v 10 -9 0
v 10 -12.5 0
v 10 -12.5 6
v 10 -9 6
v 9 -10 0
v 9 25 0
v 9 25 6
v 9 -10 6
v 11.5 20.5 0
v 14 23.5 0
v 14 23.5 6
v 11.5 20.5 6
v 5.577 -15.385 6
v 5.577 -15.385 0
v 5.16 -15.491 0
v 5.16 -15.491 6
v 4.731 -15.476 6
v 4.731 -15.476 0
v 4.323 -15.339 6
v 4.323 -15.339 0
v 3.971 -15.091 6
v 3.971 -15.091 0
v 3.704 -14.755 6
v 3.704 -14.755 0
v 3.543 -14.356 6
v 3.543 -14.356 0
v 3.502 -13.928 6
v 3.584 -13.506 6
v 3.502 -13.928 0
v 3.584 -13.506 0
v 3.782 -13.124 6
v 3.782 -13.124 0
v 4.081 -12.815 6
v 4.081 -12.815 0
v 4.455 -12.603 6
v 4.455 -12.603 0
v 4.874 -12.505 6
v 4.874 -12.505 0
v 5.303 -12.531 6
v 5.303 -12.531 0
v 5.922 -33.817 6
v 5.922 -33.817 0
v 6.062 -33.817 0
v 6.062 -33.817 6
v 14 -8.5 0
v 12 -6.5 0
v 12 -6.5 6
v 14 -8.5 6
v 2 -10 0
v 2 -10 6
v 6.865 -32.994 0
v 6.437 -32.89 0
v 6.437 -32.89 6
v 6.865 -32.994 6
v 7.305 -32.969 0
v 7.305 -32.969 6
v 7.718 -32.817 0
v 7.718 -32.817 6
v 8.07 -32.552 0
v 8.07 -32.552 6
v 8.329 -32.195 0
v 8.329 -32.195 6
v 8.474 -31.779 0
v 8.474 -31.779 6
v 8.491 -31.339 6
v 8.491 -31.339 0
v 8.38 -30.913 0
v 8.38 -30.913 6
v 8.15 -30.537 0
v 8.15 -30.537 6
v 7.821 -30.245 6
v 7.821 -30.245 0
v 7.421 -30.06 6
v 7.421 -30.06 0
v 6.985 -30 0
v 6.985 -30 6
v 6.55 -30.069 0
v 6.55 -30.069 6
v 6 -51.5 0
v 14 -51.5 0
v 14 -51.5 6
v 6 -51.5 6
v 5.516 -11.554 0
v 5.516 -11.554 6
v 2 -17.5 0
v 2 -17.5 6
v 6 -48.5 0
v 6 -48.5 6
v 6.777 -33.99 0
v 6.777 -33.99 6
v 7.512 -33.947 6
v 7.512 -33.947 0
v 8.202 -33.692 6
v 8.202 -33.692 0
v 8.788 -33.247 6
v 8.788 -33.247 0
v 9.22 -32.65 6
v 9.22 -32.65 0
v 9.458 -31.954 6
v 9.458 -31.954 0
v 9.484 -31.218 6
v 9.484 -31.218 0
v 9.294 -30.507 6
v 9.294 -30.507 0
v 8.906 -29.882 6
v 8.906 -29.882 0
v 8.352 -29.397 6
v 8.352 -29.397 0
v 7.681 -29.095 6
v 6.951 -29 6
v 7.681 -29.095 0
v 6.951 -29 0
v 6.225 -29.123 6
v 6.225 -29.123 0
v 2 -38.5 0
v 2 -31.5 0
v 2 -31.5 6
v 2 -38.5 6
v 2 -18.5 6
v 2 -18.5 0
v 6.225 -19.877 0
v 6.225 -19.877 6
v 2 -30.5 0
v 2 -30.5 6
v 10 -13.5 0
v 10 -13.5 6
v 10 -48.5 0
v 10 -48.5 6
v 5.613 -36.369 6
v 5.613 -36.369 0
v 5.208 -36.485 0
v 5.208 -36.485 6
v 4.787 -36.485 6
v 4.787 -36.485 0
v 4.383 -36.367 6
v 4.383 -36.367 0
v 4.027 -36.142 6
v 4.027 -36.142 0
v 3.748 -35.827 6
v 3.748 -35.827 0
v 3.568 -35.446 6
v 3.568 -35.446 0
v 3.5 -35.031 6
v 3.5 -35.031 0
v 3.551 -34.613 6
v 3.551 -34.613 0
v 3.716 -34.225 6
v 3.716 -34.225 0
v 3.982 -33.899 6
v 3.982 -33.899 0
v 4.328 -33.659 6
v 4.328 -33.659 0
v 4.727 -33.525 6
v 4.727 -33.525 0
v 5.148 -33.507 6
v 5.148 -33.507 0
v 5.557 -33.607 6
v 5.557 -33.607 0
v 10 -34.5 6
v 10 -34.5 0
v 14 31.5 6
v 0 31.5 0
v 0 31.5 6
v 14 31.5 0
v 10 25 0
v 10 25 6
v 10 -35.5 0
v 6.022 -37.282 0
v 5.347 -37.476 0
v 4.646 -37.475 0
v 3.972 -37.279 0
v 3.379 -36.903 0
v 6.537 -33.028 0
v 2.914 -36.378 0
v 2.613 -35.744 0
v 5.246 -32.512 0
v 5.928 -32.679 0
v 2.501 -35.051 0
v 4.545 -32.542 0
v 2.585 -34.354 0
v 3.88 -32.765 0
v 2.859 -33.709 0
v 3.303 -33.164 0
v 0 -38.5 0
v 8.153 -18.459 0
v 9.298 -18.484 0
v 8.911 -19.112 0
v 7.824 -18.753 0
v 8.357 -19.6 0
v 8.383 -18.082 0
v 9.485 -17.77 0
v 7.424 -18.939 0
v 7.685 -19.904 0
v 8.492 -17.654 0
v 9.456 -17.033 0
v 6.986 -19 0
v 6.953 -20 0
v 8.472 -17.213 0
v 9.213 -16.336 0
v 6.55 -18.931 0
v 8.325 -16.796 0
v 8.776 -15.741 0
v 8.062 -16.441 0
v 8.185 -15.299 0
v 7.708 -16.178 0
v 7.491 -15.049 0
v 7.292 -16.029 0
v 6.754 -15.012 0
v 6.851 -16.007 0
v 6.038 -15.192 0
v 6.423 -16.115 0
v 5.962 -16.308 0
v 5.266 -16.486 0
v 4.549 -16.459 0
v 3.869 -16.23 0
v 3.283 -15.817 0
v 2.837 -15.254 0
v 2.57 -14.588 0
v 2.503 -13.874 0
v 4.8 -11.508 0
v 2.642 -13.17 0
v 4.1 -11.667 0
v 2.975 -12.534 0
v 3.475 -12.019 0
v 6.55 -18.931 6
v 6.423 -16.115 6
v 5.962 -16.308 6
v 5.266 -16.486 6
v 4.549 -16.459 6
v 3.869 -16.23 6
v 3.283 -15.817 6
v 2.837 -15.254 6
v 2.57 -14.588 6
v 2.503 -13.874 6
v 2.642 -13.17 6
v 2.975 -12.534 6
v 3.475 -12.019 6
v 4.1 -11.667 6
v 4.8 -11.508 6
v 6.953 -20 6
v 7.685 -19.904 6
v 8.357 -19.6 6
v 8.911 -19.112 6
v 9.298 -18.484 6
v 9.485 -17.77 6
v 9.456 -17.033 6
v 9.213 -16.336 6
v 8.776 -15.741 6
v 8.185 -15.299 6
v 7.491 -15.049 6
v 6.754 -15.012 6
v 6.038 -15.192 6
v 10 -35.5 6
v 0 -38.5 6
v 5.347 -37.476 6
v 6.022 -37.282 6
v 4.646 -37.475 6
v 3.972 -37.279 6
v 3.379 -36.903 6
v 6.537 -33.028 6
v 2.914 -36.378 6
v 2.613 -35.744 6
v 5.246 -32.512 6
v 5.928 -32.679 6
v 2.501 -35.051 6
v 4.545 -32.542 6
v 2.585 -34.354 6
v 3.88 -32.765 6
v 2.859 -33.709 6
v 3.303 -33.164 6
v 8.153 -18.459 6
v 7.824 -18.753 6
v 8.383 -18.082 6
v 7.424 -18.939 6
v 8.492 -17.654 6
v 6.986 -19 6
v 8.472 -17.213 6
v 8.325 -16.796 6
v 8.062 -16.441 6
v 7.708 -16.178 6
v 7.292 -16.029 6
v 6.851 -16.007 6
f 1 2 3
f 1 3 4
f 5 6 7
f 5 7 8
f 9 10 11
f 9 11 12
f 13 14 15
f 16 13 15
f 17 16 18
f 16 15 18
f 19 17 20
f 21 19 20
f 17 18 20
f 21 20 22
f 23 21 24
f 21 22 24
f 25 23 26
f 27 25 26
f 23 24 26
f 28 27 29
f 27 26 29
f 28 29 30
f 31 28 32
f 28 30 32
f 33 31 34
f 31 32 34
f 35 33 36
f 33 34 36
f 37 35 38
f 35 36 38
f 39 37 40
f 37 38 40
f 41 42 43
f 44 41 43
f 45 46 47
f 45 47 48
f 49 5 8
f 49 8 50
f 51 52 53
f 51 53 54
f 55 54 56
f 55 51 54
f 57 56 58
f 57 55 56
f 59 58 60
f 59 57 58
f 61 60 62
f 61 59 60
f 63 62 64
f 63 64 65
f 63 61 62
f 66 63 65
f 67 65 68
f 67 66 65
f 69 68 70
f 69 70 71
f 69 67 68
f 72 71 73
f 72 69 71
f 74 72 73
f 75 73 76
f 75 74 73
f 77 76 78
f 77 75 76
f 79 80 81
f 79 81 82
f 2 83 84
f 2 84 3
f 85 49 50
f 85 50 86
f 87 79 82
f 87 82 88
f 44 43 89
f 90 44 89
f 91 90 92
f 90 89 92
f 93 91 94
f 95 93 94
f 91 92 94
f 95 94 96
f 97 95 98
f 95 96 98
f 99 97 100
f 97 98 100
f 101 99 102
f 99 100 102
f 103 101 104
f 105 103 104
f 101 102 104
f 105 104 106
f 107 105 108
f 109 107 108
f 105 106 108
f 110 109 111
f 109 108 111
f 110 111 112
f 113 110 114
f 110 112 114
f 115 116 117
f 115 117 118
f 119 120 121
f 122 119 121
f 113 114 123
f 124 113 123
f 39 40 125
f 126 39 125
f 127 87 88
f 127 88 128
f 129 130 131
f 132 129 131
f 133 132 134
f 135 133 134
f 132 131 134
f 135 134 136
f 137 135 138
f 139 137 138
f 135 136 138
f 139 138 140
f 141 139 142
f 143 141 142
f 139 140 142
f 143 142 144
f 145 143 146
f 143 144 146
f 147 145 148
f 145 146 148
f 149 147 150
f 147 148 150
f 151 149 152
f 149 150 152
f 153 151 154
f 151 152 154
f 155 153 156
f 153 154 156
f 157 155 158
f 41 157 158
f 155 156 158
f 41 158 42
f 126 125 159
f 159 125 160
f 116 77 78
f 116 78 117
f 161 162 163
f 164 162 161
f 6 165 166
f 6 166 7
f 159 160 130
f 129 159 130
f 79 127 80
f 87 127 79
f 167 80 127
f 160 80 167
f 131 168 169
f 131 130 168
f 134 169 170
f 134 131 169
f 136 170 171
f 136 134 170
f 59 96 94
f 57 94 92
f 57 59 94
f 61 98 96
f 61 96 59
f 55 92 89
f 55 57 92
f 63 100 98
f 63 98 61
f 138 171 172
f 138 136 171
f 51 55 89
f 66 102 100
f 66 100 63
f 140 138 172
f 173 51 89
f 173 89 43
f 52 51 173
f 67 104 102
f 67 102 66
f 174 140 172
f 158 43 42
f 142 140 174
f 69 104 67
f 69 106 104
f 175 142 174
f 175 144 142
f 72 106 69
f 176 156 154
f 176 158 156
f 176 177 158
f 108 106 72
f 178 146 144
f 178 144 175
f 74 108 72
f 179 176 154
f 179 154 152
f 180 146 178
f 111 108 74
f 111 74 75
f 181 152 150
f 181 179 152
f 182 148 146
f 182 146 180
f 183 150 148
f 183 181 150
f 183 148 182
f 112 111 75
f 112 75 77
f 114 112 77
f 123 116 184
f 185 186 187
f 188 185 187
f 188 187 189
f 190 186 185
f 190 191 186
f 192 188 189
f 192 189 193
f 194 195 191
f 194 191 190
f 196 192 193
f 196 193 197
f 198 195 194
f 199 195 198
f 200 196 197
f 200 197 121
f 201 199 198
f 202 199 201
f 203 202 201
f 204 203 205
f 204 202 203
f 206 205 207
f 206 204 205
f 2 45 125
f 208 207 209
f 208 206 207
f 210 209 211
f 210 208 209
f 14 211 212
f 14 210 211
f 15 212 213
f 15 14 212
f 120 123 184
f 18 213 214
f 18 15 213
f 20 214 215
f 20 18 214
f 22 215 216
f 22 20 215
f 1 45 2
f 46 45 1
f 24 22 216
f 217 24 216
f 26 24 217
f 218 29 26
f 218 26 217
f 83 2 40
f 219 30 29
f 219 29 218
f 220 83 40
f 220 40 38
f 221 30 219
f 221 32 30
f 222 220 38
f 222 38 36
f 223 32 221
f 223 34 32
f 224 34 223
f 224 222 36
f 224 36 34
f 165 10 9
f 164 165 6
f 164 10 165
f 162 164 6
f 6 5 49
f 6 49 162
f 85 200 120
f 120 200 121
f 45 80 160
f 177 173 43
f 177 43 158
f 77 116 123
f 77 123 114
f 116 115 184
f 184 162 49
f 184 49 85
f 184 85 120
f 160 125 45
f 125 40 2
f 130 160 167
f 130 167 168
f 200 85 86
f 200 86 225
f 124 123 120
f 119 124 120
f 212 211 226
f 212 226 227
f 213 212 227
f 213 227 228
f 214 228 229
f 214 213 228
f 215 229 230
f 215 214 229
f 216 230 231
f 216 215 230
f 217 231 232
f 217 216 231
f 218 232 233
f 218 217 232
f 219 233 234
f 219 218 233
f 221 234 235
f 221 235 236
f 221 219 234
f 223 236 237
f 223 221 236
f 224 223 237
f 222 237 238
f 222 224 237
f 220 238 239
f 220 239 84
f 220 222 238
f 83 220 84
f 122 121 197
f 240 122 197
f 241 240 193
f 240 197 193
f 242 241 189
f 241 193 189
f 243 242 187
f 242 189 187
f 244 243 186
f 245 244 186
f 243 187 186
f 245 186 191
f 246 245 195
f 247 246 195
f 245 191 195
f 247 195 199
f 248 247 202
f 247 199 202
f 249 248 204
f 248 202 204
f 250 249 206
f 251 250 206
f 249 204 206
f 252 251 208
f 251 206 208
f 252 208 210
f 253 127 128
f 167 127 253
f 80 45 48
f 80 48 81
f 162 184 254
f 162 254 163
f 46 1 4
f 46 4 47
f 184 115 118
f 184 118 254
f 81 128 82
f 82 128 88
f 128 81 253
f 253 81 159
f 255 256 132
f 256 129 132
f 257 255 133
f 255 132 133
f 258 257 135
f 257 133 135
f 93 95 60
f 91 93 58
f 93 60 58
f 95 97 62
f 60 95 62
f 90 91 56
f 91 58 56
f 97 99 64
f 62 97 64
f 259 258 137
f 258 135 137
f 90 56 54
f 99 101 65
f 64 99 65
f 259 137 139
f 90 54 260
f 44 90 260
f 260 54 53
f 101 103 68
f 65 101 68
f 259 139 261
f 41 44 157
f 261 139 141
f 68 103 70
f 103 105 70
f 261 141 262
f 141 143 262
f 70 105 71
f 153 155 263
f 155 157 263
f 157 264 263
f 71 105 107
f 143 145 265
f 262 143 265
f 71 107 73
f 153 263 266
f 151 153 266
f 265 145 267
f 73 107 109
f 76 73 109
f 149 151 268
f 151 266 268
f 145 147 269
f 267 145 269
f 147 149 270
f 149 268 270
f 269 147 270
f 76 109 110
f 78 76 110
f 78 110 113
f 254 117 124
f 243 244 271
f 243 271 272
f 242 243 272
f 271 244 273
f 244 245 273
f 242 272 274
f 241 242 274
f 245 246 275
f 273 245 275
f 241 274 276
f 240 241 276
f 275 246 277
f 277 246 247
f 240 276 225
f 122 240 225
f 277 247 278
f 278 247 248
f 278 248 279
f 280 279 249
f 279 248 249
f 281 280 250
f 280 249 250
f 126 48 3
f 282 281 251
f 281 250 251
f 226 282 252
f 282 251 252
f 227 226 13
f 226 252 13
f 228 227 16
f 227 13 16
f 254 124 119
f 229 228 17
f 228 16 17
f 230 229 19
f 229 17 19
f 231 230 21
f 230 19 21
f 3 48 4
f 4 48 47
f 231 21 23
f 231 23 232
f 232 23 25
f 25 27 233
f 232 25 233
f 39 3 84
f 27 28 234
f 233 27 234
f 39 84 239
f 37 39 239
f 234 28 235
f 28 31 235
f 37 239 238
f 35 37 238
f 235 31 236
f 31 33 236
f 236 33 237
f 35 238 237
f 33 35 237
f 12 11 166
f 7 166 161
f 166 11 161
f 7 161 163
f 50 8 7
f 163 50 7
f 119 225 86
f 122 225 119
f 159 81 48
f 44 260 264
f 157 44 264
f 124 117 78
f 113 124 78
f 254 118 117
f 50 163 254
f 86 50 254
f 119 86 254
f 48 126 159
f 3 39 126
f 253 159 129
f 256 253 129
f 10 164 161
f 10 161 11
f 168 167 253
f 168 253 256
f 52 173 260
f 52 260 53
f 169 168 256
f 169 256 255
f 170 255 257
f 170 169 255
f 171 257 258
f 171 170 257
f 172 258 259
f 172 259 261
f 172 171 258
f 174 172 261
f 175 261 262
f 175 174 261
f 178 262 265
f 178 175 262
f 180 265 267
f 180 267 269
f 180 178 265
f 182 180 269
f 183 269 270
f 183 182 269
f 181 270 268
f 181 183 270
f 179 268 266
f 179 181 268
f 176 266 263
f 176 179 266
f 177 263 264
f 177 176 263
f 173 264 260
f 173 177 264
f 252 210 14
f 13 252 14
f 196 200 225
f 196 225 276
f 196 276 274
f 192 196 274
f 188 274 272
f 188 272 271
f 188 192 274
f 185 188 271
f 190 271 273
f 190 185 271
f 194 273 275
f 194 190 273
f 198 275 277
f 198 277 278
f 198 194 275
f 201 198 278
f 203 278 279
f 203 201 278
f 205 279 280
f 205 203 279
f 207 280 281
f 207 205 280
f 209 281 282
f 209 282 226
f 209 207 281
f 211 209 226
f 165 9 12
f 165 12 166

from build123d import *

# Parameters (mm, degrees)
BOSS_EXTRUDE4_DEPTH = 6


with BuildPart() as part:
    # Sketch5 → Boss-Extrude4 (new body)
    with BuildSketch(Plane.XY):
        with BuildLine():
            Line((0, 31.5), (14, 31.5))
            Line((14, 31.5), (14, 23.5))
            Line((14, 23.5), (11.5, 20.5))
            Line((11.5, 20.5), (10, 25))
            Line((10, 25), (9, 25))
            Line((9, 25), (9, -10))
            Line((9, -10), (2, -10))
            Line((2, -10), (2, -17.5))
            Line((2, -17.5), (6.55, -18.930908802))
            ThreePointArc((6.55, -18.930908802), (8.498478182, -17.432449005), (6.423076923, -16.115384615))
            Line((6.423076923, -16.115384615), (5.961538462, -16.307692308))
            ThreePointArc((5.961538462, -16.307692308), (2.51090022, -14.2332001), (5.516159308, -11.55386436))
            Line((5.516159308, -11.55386436), (10, -12.5))
            Line((10, -12.5), (10, -9))
            Line((10, -9), (12, -6.5))
            Line((12, -6.5), (14, -8.5))
            Line((14, -8.5), (14, -51.5))
            Line((14, -51.5), (6, -51.5))
            Line((6, -51.5), (6, -48.5))
            Line((6, -48.5), (10, -48.5))
            Line((10, -48.5), (10, -35.5))
            Line((10, -35.5), (6.021836686, -37.28163314))
            ThreePointArc((6.021836686, -37.28163314), (2.518102723, -34.699690318), (6.536534963, -33.027929944))
            Line((6.536534963, -33.027929944), (6.436915421, -32.8903006))
            ThreePointArc((6.436915421, -32.8903006), (8.498796421, -31.560077342), (6.55, -30.069091198))
            Line((6.55, -30.069091198), (2, -31.5))
            Line((2, -31.5), (2, -38.5))
            Line((2, -38.5), (0, -38.5))
            Line((0, -38.5), (0, 31.5))
        make_face()
        with BuildLine():
            Line((10, -13.5), (10, -34.5))
            Line((10, -34.5), (5.613102012, -36.368979884))
            ThreePointArc((5.613102012, -36.368979884), (3.510861634, -34.819814191), (5.921920978, -33.816757966))
            Line((5.921920978, -33.816757966), (6.061525702, -33.817167666))
            ThreePointArc((6.061525702, -33.817167666), (9.498478082, -31.587219699), (6.225393962, -29.123030188))
            Line((6.225393962, -29.123030188), (2, -30.5))
            Line((2, -30.5), (2, -18.5))
            Line((2, -18.5), (6.225393962, -19.876969812))
            ThreePointArc((6.225393962, -19.876969812), (9.498012054, -17.400321638), (6.038461538, -15.192307692))
            Line((6.038461538, -15.192307692), (5.576923077, -15.384615385))
            ThreePointArc((5.576923077, -15.384615385), (3.50685843, -14.143276833), (5.303094113, -12.530941132))
            Line((5.303094113, -12.530941132), (10, -13.5))
        make_face(mode=Mode.SUBTRACT)
    extrude(amount=BOSS_EXTRUDE4_DEPTH)


solid = part.part
